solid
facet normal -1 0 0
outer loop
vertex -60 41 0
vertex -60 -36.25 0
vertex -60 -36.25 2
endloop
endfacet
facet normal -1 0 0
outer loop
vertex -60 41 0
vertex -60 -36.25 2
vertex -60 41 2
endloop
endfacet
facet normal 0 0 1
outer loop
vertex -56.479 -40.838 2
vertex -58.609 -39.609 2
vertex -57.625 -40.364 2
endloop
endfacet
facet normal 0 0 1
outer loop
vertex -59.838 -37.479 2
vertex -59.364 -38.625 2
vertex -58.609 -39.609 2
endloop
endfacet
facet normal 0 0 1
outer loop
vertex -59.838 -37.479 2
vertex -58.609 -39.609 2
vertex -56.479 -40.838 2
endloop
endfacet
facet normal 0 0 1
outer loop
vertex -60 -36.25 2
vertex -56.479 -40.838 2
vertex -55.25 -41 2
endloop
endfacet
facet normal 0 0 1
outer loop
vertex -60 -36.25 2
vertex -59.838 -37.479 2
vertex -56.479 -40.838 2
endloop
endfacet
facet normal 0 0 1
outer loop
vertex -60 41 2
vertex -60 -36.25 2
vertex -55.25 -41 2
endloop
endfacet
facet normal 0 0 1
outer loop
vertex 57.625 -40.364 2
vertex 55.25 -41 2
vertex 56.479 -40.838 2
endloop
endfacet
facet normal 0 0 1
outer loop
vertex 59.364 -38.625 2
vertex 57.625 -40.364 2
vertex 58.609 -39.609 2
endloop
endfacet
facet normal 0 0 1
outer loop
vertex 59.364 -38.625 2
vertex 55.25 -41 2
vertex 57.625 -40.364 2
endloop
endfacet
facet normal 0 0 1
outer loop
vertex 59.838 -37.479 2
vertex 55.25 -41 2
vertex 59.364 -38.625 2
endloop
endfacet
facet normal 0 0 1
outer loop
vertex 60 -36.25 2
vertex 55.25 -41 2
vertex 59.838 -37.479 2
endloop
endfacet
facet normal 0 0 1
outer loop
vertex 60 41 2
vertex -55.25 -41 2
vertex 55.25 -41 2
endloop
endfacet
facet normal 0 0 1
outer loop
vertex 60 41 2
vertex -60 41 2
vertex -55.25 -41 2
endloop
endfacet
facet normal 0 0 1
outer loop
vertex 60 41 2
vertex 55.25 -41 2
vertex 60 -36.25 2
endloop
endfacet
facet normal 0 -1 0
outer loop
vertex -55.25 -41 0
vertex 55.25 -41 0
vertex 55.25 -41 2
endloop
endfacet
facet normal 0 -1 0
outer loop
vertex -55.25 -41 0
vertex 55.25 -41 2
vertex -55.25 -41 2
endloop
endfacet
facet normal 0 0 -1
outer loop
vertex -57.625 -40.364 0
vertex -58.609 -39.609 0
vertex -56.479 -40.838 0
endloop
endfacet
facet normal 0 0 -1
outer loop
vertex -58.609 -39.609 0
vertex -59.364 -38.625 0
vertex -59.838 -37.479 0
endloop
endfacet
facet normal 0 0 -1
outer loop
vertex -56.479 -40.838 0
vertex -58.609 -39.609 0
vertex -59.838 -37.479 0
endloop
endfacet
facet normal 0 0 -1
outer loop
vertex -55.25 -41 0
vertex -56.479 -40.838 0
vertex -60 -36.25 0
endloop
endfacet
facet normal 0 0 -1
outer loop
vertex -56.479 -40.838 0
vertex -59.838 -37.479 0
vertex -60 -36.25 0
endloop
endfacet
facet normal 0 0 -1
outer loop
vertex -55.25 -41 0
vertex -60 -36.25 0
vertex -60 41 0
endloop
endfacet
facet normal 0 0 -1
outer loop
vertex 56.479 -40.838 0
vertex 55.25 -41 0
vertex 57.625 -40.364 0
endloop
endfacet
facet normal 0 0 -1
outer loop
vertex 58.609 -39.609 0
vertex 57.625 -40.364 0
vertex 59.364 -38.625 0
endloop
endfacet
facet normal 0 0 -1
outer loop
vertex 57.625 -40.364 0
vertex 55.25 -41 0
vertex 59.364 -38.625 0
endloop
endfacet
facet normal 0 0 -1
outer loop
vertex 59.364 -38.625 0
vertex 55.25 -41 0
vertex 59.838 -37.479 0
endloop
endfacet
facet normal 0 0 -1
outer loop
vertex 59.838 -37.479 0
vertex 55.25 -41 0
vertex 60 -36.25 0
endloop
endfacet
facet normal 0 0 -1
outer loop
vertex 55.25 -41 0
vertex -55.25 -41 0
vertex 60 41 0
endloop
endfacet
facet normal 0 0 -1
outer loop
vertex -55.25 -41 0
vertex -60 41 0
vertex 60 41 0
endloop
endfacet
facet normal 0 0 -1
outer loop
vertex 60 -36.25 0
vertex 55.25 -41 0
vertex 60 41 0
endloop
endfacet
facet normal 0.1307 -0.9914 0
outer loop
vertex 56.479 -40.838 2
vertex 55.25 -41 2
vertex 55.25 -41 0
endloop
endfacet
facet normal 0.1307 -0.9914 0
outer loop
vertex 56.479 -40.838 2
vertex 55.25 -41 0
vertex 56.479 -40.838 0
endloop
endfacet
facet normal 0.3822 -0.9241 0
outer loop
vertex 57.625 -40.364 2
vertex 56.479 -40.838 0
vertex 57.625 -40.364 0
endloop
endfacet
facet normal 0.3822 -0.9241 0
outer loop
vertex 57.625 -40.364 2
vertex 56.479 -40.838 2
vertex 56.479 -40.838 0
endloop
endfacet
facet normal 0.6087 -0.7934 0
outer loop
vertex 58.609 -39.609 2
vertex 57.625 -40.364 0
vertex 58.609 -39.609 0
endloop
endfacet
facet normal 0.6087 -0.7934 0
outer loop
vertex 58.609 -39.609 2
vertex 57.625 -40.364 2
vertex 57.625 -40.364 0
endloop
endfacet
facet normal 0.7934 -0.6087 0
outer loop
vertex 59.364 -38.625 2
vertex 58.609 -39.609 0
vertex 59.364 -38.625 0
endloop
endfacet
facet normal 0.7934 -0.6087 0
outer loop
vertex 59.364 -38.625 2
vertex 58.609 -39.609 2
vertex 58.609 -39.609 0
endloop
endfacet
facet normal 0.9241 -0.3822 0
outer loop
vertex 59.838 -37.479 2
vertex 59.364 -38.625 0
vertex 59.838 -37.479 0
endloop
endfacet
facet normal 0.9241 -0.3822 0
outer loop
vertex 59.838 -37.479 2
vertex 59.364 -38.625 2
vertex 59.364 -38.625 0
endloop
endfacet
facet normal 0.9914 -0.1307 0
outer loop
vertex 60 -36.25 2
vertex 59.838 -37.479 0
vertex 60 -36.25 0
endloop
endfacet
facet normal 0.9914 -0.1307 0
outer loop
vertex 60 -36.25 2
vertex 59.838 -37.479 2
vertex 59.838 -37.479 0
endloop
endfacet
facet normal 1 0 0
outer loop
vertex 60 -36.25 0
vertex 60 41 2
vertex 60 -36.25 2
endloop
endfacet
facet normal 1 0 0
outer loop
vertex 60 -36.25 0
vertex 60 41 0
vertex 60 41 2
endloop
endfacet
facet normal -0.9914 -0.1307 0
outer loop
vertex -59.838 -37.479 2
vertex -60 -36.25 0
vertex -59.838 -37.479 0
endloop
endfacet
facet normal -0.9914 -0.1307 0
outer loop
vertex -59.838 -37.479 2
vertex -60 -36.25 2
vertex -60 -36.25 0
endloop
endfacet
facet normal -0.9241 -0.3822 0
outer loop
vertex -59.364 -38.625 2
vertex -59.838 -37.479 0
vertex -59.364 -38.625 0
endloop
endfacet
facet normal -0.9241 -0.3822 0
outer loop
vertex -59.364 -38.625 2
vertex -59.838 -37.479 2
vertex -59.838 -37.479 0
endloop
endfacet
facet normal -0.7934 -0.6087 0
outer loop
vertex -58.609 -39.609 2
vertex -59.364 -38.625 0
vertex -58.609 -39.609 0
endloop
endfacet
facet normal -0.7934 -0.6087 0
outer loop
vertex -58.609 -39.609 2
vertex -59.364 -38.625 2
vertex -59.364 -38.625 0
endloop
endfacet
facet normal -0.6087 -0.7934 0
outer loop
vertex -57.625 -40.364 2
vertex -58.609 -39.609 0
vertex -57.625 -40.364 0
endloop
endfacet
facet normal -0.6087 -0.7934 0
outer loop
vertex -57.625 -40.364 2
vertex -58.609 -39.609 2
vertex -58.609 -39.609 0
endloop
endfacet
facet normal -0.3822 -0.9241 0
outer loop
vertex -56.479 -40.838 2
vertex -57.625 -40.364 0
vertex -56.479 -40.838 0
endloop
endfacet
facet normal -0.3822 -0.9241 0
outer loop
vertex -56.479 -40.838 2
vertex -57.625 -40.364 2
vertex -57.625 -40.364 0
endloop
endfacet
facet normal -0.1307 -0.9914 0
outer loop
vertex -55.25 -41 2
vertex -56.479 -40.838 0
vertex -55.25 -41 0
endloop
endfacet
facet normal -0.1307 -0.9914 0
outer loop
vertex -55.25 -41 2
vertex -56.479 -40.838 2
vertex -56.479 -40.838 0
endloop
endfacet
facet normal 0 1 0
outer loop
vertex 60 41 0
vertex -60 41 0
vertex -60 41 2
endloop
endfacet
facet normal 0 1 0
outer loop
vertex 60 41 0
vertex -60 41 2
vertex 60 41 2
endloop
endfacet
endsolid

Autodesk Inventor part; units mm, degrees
ref_plane "YZ Plane" through (0, 0, 0) normal (1, 0, 0) x (0, 1, 0)
ref_plane "XZ Plane" through (0, 0, 0) normal (0, 1, 0) x (-1, 0, 0)
ref_plane "XY Plane" through (0, 0, 0) normal (0, 0, 1) x (1, 0, 0)
sketch "Sketch1" plane through (0, 0, 0) normal (0, 0, 1) x (1, 0, 0)
  line L0 (-60, 41) -> (60, 41)
  line L1 (60, 41) -> (60, -41)
  line L2 (60, -41) -> (-60, -41)
  line L3 (-60, -41) -> (-60, 41)
  line L4 (-60, 41) -> (60, -41) construction
  point P0 (0, 0)
  point P1 (0, 0)
  dimension "d0" = 120
  dimension "d1" = 82
extrude "Plate1" add sketch "Sketch1" along normal blind 2
fillet "Corner Round2" radius 4.75 2 edges at (60, -41, 1) (-60, -41, 1)
equation "\"d2\" = Thickness"
equation "\"BendReliefWidth\" = Thickness"
equation "\"BendReliefDepth\" = 0.5 * Thickness"
equation "\"CornerReliefSize\" = 4 * Thickness"
equation "\"MinimumRemnant\" = 2 * Thickness"
equation "\"TransitionRadius\" = BendRadius"
equation "\"JacobiRadiusSize\" = BendRadius"
equation "\"GapSize\" = Thickness"
equation "\"Thickness\" = 2"
equation "\"BendRadius\" = 2.75"
properties part number "MNT-CDF-602 CAP" material "Stainless Steel"
